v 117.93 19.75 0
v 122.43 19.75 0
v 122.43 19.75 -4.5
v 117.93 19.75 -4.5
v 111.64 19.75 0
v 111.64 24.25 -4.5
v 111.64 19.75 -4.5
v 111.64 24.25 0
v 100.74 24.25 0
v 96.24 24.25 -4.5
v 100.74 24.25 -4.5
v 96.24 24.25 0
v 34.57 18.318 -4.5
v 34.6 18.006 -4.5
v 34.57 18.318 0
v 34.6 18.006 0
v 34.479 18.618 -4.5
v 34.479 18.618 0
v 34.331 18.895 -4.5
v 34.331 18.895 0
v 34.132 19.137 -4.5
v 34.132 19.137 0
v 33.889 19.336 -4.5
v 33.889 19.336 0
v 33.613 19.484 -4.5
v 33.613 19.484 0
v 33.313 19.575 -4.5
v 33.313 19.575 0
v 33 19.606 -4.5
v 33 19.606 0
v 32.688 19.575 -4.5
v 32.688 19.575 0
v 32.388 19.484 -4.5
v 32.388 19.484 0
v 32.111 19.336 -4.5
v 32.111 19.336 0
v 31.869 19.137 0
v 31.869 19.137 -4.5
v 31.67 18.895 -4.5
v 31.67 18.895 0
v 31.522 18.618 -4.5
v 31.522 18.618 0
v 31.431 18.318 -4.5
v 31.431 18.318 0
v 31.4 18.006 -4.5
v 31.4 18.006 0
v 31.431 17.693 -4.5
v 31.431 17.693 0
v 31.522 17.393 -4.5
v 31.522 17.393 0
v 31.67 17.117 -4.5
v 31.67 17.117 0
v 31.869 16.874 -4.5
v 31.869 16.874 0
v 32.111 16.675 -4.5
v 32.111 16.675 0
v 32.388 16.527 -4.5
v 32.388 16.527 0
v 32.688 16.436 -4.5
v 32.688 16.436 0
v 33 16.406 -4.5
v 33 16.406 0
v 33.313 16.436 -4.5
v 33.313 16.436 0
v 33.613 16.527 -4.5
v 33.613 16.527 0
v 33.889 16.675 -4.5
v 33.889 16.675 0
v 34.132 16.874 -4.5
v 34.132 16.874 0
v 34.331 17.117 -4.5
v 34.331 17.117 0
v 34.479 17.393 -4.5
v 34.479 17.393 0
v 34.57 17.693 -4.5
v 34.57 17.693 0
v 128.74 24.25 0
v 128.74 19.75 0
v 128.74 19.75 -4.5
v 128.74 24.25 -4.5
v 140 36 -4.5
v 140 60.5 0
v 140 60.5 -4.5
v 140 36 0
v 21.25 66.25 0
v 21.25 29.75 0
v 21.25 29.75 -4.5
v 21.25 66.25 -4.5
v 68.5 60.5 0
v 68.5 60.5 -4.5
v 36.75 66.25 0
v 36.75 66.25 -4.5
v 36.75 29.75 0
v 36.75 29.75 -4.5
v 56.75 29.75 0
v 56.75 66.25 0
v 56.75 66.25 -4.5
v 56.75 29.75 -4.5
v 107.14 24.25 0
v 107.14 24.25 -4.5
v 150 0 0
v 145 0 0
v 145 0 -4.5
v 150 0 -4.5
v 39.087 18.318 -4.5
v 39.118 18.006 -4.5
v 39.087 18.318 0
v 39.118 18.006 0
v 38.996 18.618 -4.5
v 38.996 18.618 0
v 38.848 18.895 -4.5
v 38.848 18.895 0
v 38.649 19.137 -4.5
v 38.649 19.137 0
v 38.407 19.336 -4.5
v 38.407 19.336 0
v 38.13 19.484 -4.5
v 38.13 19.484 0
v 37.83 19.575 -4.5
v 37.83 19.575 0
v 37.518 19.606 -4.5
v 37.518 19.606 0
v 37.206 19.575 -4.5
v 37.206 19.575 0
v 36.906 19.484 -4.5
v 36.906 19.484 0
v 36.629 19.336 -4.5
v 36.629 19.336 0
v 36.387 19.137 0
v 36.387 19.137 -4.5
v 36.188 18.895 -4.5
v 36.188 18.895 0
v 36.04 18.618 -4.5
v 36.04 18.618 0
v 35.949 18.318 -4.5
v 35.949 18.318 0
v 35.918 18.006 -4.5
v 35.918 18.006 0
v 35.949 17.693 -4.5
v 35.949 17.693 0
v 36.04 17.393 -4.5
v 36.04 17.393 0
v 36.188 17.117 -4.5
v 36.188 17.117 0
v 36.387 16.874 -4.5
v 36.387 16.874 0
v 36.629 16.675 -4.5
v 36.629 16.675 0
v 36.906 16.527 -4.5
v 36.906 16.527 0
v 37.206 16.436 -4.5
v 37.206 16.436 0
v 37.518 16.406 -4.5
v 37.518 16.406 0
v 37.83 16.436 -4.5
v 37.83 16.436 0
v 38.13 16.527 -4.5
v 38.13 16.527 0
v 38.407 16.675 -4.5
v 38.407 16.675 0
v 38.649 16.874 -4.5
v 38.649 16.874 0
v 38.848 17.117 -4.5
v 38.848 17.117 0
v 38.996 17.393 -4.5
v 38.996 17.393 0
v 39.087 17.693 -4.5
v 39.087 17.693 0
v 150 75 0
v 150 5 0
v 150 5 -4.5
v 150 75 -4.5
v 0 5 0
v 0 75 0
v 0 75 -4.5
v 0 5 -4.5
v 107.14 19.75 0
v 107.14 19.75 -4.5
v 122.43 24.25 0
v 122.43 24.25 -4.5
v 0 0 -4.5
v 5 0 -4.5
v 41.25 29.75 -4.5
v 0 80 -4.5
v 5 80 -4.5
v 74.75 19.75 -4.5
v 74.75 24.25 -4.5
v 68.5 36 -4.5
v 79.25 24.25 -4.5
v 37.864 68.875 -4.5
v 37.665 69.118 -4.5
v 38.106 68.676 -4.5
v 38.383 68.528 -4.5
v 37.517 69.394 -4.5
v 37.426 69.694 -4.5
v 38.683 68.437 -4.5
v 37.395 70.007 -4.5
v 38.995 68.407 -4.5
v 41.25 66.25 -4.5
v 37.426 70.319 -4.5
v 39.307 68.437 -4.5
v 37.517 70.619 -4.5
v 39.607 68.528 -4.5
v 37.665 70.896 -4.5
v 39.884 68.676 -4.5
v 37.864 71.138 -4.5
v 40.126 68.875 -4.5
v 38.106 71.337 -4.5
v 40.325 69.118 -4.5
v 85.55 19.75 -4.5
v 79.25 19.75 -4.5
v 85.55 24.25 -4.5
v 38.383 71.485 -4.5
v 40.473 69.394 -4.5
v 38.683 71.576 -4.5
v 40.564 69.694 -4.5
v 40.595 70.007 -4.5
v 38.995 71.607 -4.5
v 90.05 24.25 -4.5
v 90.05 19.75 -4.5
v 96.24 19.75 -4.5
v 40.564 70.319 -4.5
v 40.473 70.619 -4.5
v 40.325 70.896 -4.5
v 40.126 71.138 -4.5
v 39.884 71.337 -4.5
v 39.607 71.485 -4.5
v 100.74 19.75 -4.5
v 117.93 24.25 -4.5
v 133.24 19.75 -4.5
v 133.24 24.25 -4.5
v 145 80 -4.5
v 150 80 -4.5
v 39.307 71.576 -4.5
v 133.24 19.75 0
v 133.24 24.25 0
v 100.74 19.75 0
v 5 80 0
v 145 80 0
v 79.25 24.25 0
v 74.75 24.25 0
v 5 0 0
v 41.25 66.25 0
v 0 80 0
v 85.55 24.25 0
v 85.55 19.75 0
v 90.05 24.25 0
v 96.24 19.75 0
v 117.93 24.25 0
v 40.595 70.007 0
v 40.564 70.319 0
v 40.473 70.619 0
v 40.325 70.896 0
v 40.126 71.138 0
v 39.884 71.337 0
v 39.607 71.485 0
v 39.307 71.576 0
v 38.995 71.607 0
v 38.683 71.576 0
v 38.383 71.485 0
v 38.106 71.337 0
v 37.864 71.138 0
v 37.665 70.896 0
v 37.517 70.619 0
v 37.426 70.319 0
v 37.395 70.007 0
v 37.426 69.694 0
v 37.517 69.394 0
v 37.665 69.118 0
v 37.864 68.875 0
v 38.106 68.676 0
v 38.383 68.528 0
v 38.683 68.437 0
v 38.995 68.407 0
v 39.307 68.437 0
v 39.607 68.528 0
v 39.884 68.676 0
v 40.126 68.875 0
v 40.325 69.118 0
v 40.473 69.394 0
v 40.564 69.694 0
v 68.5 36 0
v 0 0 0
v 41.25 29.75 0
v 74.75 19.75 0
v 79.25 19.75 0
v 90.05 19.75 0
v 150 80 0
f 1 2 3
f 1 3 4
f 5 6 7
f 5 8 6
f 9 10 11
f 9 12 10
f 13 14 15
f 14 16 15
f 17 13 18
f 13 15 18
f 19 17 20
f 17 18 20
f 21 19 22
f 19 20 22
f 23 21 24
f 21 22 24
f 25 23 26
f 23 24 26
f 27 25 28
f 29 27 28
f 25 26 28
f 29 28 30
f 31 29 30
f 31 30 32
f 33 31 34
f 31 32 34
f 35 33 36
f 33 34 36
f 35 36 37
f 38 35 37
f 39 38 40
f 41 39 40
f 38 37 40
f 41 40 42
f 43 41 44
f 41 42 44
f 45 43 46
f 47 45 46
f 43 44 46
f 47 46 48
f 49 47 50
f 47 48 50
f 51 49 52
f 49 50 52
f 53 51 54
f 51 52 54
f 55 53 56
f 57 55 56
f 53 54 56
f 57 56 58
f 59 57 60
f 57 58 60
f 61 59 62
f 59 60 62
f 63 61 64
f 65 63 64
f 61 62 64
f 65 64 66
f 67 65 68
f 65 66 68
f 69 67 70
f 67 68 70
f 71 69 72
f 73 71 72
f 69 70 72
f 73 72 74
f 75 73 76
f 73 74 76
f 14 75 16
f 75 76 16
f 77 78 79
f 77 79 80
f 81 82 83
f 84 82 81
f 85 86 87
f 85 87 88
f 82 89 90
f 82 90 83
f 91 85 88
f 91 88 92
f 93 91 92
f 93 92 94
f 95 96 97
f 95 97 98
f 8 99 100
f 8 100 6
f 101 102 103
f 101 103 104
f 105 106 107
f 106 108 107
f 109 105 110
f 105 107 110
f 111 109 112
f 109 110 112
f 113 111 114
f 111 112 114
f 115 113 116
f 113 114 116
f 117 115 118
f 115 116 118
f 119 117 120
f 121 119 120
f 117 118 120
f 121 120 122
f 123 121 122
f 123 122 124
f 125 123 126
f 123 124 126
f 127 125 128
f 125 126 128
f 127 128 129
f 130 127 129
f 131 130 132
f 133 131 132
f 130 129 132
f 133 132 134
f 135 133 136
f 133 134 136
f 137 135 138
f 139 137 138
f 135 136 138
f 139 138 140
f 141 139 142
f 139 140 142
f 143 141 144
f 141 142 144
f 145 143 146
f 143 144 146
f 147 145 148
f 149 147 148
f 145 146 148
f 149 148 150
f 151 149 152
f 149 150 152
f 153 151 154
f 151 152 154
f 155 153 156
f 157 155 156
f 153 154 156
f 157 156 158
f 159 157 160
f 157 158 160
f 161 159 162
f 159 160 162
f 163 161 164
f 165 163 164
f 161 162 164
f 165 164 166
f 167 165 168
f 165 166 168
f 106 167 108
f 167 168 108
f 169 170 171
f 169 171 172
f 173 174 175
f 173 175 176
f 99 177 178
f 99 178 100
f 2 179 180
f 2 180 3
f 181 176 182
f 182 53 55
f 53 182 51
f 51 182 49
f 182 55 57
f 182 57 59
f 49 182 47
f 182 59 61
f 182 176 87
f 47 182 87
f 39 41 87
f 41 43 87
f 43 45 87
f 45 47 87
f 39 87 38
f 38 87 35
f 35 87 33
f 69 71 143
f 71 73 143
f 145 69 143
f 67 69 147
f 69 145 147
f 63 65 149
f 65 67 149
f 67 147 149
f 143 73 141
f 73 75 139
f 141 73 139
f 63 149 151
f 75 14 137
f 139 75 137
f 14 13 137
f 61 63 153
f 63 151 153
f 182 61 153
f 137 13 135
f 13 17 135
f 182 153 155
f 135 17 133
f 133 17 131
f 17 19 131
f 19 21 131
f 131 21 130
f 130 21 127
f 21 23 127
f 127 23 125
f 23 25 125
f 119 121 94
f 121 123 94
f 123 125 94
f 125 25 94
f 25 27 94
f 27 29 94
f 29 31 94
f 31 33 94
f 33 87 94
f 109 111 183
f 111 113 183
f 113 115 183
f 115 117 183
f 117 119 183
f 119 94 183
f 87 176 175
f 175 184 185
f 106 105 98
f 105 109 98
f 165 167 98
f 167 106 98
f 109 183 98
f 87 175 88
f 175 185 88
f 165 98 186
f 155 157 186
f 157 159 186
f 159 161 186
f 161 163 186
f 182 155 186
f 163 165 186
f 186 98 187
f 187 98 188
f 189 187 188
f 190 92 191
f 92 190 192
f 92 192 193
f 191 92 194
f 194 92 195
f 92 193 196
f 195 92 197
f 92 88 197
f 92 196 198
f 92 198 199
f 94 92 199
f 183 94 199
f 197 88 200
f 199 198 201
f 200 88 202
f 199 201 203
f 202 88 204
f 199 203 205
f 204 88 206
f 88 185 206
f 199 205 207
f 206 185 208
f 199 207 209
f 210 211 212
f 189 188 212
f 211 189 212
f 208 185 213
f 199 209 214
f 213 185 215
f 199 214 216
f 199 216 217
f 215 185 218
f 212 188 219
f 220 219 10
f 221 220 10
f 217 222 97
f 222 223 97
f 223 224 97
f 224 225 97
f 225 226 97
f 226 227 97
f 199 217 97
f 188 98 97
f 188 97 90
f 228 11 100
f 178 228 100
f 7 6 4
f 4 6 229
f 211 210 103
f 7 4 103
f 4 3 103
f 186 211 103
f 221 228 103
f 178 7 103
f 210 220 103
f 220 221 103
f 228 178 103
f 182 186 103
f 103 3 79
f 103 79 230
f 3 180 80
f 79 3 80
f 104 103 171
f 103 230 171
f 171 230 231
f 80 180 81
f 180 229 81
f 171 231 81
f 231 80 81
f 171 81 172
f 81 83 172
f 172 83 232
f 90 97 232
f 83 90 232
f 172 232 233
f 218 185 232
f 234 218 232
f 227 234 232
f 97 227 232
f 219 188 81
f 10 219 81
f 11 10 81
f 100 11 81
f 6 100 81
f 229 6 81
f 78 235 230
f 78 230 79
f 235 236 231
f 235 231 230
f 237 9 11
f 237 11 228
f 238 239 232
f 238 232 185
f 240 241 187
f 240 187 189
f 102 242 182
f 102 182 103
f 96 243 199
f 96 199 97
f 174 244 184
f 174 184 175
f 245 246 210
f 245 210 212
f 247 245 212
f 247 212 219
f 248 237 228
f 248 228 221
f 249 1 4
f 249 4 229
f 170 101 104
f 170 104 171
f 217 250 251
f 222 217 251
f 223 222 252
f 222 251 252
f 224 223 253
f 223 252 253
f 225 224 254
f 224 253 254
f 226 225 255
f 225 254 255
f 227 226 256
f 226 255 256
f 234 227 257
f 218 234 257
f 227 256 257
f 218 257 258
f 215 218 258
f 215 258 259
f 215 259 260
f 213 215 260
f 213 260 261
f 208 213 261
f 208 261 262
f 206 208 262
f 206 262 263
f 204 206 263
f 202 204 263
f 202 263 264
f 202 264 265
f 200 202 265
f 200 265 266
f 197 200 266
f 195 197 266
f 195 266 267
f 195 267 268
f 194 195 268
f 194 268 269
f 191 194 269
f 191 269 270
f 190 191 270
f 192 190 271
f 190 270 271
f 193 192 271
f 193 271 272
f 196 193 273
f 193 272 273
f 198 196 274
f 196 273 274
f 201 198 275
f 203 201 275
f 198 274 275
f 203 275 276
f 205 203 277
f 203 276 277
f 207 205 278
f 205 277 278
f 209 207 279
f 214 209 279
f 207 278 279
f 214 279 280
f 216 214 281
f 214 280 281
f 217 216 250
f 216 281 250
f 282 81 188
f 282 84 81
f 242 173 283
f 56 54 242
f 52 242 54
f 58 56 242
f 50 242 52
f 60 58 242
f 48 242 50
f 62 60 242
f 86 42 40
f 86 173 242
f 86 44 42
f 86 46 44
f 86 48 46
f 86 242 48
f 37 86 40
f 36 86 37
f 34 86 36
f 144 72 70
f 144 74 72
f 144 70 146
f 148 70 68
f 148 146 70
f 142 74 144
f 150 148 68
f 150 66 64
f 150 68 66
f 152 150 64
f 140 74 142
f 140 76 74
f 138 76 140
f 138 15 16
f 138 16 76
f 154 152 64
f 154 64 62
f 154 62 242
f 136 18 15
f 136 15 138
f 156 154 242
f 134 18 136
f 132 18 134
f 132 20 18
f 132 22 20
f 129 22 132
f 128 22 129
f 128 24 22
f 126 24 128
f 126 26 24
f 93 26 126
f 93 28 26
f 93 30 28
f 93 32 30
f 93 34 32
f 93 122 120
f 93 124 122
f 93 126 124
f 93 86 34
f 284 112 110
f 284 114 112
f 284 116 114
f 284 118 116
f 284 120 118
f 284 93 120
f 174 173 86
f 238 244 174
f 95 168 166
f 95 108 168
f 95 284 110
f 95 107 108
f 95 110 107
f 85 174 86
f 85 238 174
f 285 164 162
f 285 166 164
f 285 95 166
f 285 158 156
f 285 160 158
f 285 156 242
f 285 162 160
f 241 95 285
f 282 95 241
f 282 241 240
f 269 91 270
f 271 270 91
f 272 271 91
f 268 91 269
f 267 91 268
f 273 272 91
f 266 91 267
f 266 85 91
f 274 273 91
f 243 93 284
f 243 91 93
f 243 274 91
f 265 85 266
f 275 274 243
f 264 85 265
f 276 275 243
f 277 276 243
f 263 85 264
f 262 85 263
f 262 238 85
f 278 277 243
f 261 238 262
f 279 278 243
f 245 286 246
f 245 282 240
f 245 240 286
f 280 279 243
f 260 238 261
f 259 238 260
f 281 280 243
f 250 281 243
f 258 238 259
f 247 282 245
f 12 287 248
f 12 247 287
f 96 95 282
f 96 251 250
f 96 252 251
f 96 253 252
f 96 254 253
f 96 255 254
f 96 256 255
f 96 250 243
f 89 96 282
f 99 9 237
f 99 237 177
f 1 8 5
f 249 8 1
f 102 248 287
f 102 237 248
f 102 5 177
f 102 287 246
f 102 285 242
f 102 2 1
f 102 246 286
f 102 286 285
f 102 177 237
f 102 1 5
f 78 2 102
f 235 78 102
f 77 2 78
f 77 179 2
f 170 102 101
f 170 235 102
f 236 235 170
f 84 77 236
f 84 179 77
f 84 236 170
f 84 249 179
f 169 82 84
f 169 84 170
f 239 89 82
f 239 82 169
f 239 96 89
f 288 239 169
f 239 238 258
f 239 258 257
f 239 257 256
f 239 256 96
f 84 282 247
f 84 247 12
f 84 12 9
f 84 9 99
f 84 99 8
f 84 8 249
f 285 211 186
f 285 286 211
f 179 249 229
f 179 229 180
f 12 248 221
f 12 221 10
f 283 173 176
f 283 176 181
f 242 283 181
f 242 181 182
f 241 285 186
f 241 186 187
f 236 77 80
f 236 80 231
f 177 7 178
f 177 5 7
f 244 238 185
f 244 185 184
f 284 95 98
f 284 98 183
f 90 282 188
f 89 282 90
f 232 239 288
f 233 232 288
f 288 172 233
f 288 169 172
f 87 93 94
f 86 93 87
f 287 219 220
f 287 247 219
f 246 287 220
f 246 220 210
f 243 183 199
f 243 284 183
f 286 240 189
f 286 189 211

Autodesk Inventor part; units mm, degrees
ref_plane "YZ Plane" through (0, 0, 0) normal (1, 0, 0) x (0, 1, 0)
ref_plane "XZ Plane" through (0, 0, 0) normal (0, 1, 0) x (-1, 0, 0)
ref_plane "XY Plane" through (0, 0, 0) normal (0, 0, 1) x (1, 0, 0)
sketch "Náčrt1" plane through (0, 0, 0) normal (0, 0, 1) x (1, 0, 0)
  line L0 (0, 75) -> (0, 5) projected
  line L1 (145, 80) -> (5, 80) projected
  line L2 (5, 0) -> (145, 0) projected
  line L3 (150, 5) -> (150, 75) projected
  line L4 (21.25, 29.75) -> (21.25, 66.25) projected
  line L5 (21.25, 66.25) -> (36.75, 66.25) projected
  line L6 (36.75, 66.25) -> (36.75, 29.75) projected
  line L7 (36.75, 29.75) -> (21.25, 29.75) projected
  line L8 (41.25, 29.75) -> (41.25, 66.25) projected
  line L9 (56.75, 29.75) -> (41.25, 29.75) projected
  line L10 (56.75, 66.25) -> (56.75, 29.75) projected
  line L11 (41.25, 66.25) -> (56.75, 66.25) projected
  line L12 (140, 36) -> (68.5, 36) projected
  line L13 (68.5, 36) -> (68.5, 60.5) projected
  line L14 (68.5, 60.5) -> (140, 60.5) projected
  line L15 (140, 60.5) -> (140, 36) projected
  line L16 (74.75, 19.75) -> (74.75, 24.25) projected
  line L17 (79.25, 24.25) -> (79.25, 19.75) projected
  line L18 (74.75, 24.25) -> (79.25, 24.25) projected
  line L19 (79.25, 19.75) -> (74.75, 19.75) projected
  line L20 (90.05, 19.75) -> (85.55, 19.75) projected
  line L21 (85.55, 19.75) -> (85.55, 24.25) projected
  line L22 (85.55, 24.25) -> (90.05, 24.25) projected
  line L23 (90.05, 24.25) -> (90.05, 19.75) projected
  line L24 (96.24, 19.75) -> (96.24, 24.25) projected
  line L25 (96.24, 24.25) -> (100.74, 24.25) projected
  line L26 (100.74, 19.75) -> (96.24, 19.75) projected
  line L27 (100.74, 24.25) -> (100.74, 19.75) projected
  line L28 (107.14, 19.75) -> (107.14, 24.25) projected
  line L29 (107.14, 24.25) -> (111.64, 24.25) projected
  line L30 (111.64, 19.75) -> (107.14, 19.75) projected
  line L31 (111.64, 24.25) -> (111.64, 19.75) projected
  line L32 (117.93, 19.75) -> (117.93, 24.25) projected
  line L33 (117.93, 24.25) -> (122.43, 24.25) projected
  line L34 (122.43, 19.75) -> (117.93, 19.75) projected
  line L35 (122.43, 24.25) -> (122.43, 19.75) projected
  line L36 (128.74, 19.75) -> (128.74, 24.25) projected
  line L37 (128.74, 24.25) -> (133.24, 24.25) projected
  line L38 (133.24, 19.75) -> (128.74, 19.75) projected
  line L39 (133.24, 24.25) -> (133.24, 19.75) projected
  circle A0 centre (38.995, 70.0066) radius 1.6
  circle A1 centre (33.0004, 18.0056) radius 1.6
  circle A2 centre (37.518, 18.0056) radius 1.6
  line L40 (5, 80) -> (0, 80)
  line L41 (0, 80) -> (0, 75)
  line L42 (0, 5) -> (0, 0)
  line L43 (0, 0) -> (5, 0)
  line L44 (145, 0) -> (150, 0)
  line L45 (150, 0) -> (150, 5)
  line L46 (150, 75) -> (150, 80)
  line L47 (145, 80) -> (150, 80)
  dimension "d0" = 3.2
  dimension "d1" = 3.2
  dimension "d2" = 3.2
extrude "Vysunutí1" add sketch "Náčrt1" against normal blind 4.5
properties part number "top"
